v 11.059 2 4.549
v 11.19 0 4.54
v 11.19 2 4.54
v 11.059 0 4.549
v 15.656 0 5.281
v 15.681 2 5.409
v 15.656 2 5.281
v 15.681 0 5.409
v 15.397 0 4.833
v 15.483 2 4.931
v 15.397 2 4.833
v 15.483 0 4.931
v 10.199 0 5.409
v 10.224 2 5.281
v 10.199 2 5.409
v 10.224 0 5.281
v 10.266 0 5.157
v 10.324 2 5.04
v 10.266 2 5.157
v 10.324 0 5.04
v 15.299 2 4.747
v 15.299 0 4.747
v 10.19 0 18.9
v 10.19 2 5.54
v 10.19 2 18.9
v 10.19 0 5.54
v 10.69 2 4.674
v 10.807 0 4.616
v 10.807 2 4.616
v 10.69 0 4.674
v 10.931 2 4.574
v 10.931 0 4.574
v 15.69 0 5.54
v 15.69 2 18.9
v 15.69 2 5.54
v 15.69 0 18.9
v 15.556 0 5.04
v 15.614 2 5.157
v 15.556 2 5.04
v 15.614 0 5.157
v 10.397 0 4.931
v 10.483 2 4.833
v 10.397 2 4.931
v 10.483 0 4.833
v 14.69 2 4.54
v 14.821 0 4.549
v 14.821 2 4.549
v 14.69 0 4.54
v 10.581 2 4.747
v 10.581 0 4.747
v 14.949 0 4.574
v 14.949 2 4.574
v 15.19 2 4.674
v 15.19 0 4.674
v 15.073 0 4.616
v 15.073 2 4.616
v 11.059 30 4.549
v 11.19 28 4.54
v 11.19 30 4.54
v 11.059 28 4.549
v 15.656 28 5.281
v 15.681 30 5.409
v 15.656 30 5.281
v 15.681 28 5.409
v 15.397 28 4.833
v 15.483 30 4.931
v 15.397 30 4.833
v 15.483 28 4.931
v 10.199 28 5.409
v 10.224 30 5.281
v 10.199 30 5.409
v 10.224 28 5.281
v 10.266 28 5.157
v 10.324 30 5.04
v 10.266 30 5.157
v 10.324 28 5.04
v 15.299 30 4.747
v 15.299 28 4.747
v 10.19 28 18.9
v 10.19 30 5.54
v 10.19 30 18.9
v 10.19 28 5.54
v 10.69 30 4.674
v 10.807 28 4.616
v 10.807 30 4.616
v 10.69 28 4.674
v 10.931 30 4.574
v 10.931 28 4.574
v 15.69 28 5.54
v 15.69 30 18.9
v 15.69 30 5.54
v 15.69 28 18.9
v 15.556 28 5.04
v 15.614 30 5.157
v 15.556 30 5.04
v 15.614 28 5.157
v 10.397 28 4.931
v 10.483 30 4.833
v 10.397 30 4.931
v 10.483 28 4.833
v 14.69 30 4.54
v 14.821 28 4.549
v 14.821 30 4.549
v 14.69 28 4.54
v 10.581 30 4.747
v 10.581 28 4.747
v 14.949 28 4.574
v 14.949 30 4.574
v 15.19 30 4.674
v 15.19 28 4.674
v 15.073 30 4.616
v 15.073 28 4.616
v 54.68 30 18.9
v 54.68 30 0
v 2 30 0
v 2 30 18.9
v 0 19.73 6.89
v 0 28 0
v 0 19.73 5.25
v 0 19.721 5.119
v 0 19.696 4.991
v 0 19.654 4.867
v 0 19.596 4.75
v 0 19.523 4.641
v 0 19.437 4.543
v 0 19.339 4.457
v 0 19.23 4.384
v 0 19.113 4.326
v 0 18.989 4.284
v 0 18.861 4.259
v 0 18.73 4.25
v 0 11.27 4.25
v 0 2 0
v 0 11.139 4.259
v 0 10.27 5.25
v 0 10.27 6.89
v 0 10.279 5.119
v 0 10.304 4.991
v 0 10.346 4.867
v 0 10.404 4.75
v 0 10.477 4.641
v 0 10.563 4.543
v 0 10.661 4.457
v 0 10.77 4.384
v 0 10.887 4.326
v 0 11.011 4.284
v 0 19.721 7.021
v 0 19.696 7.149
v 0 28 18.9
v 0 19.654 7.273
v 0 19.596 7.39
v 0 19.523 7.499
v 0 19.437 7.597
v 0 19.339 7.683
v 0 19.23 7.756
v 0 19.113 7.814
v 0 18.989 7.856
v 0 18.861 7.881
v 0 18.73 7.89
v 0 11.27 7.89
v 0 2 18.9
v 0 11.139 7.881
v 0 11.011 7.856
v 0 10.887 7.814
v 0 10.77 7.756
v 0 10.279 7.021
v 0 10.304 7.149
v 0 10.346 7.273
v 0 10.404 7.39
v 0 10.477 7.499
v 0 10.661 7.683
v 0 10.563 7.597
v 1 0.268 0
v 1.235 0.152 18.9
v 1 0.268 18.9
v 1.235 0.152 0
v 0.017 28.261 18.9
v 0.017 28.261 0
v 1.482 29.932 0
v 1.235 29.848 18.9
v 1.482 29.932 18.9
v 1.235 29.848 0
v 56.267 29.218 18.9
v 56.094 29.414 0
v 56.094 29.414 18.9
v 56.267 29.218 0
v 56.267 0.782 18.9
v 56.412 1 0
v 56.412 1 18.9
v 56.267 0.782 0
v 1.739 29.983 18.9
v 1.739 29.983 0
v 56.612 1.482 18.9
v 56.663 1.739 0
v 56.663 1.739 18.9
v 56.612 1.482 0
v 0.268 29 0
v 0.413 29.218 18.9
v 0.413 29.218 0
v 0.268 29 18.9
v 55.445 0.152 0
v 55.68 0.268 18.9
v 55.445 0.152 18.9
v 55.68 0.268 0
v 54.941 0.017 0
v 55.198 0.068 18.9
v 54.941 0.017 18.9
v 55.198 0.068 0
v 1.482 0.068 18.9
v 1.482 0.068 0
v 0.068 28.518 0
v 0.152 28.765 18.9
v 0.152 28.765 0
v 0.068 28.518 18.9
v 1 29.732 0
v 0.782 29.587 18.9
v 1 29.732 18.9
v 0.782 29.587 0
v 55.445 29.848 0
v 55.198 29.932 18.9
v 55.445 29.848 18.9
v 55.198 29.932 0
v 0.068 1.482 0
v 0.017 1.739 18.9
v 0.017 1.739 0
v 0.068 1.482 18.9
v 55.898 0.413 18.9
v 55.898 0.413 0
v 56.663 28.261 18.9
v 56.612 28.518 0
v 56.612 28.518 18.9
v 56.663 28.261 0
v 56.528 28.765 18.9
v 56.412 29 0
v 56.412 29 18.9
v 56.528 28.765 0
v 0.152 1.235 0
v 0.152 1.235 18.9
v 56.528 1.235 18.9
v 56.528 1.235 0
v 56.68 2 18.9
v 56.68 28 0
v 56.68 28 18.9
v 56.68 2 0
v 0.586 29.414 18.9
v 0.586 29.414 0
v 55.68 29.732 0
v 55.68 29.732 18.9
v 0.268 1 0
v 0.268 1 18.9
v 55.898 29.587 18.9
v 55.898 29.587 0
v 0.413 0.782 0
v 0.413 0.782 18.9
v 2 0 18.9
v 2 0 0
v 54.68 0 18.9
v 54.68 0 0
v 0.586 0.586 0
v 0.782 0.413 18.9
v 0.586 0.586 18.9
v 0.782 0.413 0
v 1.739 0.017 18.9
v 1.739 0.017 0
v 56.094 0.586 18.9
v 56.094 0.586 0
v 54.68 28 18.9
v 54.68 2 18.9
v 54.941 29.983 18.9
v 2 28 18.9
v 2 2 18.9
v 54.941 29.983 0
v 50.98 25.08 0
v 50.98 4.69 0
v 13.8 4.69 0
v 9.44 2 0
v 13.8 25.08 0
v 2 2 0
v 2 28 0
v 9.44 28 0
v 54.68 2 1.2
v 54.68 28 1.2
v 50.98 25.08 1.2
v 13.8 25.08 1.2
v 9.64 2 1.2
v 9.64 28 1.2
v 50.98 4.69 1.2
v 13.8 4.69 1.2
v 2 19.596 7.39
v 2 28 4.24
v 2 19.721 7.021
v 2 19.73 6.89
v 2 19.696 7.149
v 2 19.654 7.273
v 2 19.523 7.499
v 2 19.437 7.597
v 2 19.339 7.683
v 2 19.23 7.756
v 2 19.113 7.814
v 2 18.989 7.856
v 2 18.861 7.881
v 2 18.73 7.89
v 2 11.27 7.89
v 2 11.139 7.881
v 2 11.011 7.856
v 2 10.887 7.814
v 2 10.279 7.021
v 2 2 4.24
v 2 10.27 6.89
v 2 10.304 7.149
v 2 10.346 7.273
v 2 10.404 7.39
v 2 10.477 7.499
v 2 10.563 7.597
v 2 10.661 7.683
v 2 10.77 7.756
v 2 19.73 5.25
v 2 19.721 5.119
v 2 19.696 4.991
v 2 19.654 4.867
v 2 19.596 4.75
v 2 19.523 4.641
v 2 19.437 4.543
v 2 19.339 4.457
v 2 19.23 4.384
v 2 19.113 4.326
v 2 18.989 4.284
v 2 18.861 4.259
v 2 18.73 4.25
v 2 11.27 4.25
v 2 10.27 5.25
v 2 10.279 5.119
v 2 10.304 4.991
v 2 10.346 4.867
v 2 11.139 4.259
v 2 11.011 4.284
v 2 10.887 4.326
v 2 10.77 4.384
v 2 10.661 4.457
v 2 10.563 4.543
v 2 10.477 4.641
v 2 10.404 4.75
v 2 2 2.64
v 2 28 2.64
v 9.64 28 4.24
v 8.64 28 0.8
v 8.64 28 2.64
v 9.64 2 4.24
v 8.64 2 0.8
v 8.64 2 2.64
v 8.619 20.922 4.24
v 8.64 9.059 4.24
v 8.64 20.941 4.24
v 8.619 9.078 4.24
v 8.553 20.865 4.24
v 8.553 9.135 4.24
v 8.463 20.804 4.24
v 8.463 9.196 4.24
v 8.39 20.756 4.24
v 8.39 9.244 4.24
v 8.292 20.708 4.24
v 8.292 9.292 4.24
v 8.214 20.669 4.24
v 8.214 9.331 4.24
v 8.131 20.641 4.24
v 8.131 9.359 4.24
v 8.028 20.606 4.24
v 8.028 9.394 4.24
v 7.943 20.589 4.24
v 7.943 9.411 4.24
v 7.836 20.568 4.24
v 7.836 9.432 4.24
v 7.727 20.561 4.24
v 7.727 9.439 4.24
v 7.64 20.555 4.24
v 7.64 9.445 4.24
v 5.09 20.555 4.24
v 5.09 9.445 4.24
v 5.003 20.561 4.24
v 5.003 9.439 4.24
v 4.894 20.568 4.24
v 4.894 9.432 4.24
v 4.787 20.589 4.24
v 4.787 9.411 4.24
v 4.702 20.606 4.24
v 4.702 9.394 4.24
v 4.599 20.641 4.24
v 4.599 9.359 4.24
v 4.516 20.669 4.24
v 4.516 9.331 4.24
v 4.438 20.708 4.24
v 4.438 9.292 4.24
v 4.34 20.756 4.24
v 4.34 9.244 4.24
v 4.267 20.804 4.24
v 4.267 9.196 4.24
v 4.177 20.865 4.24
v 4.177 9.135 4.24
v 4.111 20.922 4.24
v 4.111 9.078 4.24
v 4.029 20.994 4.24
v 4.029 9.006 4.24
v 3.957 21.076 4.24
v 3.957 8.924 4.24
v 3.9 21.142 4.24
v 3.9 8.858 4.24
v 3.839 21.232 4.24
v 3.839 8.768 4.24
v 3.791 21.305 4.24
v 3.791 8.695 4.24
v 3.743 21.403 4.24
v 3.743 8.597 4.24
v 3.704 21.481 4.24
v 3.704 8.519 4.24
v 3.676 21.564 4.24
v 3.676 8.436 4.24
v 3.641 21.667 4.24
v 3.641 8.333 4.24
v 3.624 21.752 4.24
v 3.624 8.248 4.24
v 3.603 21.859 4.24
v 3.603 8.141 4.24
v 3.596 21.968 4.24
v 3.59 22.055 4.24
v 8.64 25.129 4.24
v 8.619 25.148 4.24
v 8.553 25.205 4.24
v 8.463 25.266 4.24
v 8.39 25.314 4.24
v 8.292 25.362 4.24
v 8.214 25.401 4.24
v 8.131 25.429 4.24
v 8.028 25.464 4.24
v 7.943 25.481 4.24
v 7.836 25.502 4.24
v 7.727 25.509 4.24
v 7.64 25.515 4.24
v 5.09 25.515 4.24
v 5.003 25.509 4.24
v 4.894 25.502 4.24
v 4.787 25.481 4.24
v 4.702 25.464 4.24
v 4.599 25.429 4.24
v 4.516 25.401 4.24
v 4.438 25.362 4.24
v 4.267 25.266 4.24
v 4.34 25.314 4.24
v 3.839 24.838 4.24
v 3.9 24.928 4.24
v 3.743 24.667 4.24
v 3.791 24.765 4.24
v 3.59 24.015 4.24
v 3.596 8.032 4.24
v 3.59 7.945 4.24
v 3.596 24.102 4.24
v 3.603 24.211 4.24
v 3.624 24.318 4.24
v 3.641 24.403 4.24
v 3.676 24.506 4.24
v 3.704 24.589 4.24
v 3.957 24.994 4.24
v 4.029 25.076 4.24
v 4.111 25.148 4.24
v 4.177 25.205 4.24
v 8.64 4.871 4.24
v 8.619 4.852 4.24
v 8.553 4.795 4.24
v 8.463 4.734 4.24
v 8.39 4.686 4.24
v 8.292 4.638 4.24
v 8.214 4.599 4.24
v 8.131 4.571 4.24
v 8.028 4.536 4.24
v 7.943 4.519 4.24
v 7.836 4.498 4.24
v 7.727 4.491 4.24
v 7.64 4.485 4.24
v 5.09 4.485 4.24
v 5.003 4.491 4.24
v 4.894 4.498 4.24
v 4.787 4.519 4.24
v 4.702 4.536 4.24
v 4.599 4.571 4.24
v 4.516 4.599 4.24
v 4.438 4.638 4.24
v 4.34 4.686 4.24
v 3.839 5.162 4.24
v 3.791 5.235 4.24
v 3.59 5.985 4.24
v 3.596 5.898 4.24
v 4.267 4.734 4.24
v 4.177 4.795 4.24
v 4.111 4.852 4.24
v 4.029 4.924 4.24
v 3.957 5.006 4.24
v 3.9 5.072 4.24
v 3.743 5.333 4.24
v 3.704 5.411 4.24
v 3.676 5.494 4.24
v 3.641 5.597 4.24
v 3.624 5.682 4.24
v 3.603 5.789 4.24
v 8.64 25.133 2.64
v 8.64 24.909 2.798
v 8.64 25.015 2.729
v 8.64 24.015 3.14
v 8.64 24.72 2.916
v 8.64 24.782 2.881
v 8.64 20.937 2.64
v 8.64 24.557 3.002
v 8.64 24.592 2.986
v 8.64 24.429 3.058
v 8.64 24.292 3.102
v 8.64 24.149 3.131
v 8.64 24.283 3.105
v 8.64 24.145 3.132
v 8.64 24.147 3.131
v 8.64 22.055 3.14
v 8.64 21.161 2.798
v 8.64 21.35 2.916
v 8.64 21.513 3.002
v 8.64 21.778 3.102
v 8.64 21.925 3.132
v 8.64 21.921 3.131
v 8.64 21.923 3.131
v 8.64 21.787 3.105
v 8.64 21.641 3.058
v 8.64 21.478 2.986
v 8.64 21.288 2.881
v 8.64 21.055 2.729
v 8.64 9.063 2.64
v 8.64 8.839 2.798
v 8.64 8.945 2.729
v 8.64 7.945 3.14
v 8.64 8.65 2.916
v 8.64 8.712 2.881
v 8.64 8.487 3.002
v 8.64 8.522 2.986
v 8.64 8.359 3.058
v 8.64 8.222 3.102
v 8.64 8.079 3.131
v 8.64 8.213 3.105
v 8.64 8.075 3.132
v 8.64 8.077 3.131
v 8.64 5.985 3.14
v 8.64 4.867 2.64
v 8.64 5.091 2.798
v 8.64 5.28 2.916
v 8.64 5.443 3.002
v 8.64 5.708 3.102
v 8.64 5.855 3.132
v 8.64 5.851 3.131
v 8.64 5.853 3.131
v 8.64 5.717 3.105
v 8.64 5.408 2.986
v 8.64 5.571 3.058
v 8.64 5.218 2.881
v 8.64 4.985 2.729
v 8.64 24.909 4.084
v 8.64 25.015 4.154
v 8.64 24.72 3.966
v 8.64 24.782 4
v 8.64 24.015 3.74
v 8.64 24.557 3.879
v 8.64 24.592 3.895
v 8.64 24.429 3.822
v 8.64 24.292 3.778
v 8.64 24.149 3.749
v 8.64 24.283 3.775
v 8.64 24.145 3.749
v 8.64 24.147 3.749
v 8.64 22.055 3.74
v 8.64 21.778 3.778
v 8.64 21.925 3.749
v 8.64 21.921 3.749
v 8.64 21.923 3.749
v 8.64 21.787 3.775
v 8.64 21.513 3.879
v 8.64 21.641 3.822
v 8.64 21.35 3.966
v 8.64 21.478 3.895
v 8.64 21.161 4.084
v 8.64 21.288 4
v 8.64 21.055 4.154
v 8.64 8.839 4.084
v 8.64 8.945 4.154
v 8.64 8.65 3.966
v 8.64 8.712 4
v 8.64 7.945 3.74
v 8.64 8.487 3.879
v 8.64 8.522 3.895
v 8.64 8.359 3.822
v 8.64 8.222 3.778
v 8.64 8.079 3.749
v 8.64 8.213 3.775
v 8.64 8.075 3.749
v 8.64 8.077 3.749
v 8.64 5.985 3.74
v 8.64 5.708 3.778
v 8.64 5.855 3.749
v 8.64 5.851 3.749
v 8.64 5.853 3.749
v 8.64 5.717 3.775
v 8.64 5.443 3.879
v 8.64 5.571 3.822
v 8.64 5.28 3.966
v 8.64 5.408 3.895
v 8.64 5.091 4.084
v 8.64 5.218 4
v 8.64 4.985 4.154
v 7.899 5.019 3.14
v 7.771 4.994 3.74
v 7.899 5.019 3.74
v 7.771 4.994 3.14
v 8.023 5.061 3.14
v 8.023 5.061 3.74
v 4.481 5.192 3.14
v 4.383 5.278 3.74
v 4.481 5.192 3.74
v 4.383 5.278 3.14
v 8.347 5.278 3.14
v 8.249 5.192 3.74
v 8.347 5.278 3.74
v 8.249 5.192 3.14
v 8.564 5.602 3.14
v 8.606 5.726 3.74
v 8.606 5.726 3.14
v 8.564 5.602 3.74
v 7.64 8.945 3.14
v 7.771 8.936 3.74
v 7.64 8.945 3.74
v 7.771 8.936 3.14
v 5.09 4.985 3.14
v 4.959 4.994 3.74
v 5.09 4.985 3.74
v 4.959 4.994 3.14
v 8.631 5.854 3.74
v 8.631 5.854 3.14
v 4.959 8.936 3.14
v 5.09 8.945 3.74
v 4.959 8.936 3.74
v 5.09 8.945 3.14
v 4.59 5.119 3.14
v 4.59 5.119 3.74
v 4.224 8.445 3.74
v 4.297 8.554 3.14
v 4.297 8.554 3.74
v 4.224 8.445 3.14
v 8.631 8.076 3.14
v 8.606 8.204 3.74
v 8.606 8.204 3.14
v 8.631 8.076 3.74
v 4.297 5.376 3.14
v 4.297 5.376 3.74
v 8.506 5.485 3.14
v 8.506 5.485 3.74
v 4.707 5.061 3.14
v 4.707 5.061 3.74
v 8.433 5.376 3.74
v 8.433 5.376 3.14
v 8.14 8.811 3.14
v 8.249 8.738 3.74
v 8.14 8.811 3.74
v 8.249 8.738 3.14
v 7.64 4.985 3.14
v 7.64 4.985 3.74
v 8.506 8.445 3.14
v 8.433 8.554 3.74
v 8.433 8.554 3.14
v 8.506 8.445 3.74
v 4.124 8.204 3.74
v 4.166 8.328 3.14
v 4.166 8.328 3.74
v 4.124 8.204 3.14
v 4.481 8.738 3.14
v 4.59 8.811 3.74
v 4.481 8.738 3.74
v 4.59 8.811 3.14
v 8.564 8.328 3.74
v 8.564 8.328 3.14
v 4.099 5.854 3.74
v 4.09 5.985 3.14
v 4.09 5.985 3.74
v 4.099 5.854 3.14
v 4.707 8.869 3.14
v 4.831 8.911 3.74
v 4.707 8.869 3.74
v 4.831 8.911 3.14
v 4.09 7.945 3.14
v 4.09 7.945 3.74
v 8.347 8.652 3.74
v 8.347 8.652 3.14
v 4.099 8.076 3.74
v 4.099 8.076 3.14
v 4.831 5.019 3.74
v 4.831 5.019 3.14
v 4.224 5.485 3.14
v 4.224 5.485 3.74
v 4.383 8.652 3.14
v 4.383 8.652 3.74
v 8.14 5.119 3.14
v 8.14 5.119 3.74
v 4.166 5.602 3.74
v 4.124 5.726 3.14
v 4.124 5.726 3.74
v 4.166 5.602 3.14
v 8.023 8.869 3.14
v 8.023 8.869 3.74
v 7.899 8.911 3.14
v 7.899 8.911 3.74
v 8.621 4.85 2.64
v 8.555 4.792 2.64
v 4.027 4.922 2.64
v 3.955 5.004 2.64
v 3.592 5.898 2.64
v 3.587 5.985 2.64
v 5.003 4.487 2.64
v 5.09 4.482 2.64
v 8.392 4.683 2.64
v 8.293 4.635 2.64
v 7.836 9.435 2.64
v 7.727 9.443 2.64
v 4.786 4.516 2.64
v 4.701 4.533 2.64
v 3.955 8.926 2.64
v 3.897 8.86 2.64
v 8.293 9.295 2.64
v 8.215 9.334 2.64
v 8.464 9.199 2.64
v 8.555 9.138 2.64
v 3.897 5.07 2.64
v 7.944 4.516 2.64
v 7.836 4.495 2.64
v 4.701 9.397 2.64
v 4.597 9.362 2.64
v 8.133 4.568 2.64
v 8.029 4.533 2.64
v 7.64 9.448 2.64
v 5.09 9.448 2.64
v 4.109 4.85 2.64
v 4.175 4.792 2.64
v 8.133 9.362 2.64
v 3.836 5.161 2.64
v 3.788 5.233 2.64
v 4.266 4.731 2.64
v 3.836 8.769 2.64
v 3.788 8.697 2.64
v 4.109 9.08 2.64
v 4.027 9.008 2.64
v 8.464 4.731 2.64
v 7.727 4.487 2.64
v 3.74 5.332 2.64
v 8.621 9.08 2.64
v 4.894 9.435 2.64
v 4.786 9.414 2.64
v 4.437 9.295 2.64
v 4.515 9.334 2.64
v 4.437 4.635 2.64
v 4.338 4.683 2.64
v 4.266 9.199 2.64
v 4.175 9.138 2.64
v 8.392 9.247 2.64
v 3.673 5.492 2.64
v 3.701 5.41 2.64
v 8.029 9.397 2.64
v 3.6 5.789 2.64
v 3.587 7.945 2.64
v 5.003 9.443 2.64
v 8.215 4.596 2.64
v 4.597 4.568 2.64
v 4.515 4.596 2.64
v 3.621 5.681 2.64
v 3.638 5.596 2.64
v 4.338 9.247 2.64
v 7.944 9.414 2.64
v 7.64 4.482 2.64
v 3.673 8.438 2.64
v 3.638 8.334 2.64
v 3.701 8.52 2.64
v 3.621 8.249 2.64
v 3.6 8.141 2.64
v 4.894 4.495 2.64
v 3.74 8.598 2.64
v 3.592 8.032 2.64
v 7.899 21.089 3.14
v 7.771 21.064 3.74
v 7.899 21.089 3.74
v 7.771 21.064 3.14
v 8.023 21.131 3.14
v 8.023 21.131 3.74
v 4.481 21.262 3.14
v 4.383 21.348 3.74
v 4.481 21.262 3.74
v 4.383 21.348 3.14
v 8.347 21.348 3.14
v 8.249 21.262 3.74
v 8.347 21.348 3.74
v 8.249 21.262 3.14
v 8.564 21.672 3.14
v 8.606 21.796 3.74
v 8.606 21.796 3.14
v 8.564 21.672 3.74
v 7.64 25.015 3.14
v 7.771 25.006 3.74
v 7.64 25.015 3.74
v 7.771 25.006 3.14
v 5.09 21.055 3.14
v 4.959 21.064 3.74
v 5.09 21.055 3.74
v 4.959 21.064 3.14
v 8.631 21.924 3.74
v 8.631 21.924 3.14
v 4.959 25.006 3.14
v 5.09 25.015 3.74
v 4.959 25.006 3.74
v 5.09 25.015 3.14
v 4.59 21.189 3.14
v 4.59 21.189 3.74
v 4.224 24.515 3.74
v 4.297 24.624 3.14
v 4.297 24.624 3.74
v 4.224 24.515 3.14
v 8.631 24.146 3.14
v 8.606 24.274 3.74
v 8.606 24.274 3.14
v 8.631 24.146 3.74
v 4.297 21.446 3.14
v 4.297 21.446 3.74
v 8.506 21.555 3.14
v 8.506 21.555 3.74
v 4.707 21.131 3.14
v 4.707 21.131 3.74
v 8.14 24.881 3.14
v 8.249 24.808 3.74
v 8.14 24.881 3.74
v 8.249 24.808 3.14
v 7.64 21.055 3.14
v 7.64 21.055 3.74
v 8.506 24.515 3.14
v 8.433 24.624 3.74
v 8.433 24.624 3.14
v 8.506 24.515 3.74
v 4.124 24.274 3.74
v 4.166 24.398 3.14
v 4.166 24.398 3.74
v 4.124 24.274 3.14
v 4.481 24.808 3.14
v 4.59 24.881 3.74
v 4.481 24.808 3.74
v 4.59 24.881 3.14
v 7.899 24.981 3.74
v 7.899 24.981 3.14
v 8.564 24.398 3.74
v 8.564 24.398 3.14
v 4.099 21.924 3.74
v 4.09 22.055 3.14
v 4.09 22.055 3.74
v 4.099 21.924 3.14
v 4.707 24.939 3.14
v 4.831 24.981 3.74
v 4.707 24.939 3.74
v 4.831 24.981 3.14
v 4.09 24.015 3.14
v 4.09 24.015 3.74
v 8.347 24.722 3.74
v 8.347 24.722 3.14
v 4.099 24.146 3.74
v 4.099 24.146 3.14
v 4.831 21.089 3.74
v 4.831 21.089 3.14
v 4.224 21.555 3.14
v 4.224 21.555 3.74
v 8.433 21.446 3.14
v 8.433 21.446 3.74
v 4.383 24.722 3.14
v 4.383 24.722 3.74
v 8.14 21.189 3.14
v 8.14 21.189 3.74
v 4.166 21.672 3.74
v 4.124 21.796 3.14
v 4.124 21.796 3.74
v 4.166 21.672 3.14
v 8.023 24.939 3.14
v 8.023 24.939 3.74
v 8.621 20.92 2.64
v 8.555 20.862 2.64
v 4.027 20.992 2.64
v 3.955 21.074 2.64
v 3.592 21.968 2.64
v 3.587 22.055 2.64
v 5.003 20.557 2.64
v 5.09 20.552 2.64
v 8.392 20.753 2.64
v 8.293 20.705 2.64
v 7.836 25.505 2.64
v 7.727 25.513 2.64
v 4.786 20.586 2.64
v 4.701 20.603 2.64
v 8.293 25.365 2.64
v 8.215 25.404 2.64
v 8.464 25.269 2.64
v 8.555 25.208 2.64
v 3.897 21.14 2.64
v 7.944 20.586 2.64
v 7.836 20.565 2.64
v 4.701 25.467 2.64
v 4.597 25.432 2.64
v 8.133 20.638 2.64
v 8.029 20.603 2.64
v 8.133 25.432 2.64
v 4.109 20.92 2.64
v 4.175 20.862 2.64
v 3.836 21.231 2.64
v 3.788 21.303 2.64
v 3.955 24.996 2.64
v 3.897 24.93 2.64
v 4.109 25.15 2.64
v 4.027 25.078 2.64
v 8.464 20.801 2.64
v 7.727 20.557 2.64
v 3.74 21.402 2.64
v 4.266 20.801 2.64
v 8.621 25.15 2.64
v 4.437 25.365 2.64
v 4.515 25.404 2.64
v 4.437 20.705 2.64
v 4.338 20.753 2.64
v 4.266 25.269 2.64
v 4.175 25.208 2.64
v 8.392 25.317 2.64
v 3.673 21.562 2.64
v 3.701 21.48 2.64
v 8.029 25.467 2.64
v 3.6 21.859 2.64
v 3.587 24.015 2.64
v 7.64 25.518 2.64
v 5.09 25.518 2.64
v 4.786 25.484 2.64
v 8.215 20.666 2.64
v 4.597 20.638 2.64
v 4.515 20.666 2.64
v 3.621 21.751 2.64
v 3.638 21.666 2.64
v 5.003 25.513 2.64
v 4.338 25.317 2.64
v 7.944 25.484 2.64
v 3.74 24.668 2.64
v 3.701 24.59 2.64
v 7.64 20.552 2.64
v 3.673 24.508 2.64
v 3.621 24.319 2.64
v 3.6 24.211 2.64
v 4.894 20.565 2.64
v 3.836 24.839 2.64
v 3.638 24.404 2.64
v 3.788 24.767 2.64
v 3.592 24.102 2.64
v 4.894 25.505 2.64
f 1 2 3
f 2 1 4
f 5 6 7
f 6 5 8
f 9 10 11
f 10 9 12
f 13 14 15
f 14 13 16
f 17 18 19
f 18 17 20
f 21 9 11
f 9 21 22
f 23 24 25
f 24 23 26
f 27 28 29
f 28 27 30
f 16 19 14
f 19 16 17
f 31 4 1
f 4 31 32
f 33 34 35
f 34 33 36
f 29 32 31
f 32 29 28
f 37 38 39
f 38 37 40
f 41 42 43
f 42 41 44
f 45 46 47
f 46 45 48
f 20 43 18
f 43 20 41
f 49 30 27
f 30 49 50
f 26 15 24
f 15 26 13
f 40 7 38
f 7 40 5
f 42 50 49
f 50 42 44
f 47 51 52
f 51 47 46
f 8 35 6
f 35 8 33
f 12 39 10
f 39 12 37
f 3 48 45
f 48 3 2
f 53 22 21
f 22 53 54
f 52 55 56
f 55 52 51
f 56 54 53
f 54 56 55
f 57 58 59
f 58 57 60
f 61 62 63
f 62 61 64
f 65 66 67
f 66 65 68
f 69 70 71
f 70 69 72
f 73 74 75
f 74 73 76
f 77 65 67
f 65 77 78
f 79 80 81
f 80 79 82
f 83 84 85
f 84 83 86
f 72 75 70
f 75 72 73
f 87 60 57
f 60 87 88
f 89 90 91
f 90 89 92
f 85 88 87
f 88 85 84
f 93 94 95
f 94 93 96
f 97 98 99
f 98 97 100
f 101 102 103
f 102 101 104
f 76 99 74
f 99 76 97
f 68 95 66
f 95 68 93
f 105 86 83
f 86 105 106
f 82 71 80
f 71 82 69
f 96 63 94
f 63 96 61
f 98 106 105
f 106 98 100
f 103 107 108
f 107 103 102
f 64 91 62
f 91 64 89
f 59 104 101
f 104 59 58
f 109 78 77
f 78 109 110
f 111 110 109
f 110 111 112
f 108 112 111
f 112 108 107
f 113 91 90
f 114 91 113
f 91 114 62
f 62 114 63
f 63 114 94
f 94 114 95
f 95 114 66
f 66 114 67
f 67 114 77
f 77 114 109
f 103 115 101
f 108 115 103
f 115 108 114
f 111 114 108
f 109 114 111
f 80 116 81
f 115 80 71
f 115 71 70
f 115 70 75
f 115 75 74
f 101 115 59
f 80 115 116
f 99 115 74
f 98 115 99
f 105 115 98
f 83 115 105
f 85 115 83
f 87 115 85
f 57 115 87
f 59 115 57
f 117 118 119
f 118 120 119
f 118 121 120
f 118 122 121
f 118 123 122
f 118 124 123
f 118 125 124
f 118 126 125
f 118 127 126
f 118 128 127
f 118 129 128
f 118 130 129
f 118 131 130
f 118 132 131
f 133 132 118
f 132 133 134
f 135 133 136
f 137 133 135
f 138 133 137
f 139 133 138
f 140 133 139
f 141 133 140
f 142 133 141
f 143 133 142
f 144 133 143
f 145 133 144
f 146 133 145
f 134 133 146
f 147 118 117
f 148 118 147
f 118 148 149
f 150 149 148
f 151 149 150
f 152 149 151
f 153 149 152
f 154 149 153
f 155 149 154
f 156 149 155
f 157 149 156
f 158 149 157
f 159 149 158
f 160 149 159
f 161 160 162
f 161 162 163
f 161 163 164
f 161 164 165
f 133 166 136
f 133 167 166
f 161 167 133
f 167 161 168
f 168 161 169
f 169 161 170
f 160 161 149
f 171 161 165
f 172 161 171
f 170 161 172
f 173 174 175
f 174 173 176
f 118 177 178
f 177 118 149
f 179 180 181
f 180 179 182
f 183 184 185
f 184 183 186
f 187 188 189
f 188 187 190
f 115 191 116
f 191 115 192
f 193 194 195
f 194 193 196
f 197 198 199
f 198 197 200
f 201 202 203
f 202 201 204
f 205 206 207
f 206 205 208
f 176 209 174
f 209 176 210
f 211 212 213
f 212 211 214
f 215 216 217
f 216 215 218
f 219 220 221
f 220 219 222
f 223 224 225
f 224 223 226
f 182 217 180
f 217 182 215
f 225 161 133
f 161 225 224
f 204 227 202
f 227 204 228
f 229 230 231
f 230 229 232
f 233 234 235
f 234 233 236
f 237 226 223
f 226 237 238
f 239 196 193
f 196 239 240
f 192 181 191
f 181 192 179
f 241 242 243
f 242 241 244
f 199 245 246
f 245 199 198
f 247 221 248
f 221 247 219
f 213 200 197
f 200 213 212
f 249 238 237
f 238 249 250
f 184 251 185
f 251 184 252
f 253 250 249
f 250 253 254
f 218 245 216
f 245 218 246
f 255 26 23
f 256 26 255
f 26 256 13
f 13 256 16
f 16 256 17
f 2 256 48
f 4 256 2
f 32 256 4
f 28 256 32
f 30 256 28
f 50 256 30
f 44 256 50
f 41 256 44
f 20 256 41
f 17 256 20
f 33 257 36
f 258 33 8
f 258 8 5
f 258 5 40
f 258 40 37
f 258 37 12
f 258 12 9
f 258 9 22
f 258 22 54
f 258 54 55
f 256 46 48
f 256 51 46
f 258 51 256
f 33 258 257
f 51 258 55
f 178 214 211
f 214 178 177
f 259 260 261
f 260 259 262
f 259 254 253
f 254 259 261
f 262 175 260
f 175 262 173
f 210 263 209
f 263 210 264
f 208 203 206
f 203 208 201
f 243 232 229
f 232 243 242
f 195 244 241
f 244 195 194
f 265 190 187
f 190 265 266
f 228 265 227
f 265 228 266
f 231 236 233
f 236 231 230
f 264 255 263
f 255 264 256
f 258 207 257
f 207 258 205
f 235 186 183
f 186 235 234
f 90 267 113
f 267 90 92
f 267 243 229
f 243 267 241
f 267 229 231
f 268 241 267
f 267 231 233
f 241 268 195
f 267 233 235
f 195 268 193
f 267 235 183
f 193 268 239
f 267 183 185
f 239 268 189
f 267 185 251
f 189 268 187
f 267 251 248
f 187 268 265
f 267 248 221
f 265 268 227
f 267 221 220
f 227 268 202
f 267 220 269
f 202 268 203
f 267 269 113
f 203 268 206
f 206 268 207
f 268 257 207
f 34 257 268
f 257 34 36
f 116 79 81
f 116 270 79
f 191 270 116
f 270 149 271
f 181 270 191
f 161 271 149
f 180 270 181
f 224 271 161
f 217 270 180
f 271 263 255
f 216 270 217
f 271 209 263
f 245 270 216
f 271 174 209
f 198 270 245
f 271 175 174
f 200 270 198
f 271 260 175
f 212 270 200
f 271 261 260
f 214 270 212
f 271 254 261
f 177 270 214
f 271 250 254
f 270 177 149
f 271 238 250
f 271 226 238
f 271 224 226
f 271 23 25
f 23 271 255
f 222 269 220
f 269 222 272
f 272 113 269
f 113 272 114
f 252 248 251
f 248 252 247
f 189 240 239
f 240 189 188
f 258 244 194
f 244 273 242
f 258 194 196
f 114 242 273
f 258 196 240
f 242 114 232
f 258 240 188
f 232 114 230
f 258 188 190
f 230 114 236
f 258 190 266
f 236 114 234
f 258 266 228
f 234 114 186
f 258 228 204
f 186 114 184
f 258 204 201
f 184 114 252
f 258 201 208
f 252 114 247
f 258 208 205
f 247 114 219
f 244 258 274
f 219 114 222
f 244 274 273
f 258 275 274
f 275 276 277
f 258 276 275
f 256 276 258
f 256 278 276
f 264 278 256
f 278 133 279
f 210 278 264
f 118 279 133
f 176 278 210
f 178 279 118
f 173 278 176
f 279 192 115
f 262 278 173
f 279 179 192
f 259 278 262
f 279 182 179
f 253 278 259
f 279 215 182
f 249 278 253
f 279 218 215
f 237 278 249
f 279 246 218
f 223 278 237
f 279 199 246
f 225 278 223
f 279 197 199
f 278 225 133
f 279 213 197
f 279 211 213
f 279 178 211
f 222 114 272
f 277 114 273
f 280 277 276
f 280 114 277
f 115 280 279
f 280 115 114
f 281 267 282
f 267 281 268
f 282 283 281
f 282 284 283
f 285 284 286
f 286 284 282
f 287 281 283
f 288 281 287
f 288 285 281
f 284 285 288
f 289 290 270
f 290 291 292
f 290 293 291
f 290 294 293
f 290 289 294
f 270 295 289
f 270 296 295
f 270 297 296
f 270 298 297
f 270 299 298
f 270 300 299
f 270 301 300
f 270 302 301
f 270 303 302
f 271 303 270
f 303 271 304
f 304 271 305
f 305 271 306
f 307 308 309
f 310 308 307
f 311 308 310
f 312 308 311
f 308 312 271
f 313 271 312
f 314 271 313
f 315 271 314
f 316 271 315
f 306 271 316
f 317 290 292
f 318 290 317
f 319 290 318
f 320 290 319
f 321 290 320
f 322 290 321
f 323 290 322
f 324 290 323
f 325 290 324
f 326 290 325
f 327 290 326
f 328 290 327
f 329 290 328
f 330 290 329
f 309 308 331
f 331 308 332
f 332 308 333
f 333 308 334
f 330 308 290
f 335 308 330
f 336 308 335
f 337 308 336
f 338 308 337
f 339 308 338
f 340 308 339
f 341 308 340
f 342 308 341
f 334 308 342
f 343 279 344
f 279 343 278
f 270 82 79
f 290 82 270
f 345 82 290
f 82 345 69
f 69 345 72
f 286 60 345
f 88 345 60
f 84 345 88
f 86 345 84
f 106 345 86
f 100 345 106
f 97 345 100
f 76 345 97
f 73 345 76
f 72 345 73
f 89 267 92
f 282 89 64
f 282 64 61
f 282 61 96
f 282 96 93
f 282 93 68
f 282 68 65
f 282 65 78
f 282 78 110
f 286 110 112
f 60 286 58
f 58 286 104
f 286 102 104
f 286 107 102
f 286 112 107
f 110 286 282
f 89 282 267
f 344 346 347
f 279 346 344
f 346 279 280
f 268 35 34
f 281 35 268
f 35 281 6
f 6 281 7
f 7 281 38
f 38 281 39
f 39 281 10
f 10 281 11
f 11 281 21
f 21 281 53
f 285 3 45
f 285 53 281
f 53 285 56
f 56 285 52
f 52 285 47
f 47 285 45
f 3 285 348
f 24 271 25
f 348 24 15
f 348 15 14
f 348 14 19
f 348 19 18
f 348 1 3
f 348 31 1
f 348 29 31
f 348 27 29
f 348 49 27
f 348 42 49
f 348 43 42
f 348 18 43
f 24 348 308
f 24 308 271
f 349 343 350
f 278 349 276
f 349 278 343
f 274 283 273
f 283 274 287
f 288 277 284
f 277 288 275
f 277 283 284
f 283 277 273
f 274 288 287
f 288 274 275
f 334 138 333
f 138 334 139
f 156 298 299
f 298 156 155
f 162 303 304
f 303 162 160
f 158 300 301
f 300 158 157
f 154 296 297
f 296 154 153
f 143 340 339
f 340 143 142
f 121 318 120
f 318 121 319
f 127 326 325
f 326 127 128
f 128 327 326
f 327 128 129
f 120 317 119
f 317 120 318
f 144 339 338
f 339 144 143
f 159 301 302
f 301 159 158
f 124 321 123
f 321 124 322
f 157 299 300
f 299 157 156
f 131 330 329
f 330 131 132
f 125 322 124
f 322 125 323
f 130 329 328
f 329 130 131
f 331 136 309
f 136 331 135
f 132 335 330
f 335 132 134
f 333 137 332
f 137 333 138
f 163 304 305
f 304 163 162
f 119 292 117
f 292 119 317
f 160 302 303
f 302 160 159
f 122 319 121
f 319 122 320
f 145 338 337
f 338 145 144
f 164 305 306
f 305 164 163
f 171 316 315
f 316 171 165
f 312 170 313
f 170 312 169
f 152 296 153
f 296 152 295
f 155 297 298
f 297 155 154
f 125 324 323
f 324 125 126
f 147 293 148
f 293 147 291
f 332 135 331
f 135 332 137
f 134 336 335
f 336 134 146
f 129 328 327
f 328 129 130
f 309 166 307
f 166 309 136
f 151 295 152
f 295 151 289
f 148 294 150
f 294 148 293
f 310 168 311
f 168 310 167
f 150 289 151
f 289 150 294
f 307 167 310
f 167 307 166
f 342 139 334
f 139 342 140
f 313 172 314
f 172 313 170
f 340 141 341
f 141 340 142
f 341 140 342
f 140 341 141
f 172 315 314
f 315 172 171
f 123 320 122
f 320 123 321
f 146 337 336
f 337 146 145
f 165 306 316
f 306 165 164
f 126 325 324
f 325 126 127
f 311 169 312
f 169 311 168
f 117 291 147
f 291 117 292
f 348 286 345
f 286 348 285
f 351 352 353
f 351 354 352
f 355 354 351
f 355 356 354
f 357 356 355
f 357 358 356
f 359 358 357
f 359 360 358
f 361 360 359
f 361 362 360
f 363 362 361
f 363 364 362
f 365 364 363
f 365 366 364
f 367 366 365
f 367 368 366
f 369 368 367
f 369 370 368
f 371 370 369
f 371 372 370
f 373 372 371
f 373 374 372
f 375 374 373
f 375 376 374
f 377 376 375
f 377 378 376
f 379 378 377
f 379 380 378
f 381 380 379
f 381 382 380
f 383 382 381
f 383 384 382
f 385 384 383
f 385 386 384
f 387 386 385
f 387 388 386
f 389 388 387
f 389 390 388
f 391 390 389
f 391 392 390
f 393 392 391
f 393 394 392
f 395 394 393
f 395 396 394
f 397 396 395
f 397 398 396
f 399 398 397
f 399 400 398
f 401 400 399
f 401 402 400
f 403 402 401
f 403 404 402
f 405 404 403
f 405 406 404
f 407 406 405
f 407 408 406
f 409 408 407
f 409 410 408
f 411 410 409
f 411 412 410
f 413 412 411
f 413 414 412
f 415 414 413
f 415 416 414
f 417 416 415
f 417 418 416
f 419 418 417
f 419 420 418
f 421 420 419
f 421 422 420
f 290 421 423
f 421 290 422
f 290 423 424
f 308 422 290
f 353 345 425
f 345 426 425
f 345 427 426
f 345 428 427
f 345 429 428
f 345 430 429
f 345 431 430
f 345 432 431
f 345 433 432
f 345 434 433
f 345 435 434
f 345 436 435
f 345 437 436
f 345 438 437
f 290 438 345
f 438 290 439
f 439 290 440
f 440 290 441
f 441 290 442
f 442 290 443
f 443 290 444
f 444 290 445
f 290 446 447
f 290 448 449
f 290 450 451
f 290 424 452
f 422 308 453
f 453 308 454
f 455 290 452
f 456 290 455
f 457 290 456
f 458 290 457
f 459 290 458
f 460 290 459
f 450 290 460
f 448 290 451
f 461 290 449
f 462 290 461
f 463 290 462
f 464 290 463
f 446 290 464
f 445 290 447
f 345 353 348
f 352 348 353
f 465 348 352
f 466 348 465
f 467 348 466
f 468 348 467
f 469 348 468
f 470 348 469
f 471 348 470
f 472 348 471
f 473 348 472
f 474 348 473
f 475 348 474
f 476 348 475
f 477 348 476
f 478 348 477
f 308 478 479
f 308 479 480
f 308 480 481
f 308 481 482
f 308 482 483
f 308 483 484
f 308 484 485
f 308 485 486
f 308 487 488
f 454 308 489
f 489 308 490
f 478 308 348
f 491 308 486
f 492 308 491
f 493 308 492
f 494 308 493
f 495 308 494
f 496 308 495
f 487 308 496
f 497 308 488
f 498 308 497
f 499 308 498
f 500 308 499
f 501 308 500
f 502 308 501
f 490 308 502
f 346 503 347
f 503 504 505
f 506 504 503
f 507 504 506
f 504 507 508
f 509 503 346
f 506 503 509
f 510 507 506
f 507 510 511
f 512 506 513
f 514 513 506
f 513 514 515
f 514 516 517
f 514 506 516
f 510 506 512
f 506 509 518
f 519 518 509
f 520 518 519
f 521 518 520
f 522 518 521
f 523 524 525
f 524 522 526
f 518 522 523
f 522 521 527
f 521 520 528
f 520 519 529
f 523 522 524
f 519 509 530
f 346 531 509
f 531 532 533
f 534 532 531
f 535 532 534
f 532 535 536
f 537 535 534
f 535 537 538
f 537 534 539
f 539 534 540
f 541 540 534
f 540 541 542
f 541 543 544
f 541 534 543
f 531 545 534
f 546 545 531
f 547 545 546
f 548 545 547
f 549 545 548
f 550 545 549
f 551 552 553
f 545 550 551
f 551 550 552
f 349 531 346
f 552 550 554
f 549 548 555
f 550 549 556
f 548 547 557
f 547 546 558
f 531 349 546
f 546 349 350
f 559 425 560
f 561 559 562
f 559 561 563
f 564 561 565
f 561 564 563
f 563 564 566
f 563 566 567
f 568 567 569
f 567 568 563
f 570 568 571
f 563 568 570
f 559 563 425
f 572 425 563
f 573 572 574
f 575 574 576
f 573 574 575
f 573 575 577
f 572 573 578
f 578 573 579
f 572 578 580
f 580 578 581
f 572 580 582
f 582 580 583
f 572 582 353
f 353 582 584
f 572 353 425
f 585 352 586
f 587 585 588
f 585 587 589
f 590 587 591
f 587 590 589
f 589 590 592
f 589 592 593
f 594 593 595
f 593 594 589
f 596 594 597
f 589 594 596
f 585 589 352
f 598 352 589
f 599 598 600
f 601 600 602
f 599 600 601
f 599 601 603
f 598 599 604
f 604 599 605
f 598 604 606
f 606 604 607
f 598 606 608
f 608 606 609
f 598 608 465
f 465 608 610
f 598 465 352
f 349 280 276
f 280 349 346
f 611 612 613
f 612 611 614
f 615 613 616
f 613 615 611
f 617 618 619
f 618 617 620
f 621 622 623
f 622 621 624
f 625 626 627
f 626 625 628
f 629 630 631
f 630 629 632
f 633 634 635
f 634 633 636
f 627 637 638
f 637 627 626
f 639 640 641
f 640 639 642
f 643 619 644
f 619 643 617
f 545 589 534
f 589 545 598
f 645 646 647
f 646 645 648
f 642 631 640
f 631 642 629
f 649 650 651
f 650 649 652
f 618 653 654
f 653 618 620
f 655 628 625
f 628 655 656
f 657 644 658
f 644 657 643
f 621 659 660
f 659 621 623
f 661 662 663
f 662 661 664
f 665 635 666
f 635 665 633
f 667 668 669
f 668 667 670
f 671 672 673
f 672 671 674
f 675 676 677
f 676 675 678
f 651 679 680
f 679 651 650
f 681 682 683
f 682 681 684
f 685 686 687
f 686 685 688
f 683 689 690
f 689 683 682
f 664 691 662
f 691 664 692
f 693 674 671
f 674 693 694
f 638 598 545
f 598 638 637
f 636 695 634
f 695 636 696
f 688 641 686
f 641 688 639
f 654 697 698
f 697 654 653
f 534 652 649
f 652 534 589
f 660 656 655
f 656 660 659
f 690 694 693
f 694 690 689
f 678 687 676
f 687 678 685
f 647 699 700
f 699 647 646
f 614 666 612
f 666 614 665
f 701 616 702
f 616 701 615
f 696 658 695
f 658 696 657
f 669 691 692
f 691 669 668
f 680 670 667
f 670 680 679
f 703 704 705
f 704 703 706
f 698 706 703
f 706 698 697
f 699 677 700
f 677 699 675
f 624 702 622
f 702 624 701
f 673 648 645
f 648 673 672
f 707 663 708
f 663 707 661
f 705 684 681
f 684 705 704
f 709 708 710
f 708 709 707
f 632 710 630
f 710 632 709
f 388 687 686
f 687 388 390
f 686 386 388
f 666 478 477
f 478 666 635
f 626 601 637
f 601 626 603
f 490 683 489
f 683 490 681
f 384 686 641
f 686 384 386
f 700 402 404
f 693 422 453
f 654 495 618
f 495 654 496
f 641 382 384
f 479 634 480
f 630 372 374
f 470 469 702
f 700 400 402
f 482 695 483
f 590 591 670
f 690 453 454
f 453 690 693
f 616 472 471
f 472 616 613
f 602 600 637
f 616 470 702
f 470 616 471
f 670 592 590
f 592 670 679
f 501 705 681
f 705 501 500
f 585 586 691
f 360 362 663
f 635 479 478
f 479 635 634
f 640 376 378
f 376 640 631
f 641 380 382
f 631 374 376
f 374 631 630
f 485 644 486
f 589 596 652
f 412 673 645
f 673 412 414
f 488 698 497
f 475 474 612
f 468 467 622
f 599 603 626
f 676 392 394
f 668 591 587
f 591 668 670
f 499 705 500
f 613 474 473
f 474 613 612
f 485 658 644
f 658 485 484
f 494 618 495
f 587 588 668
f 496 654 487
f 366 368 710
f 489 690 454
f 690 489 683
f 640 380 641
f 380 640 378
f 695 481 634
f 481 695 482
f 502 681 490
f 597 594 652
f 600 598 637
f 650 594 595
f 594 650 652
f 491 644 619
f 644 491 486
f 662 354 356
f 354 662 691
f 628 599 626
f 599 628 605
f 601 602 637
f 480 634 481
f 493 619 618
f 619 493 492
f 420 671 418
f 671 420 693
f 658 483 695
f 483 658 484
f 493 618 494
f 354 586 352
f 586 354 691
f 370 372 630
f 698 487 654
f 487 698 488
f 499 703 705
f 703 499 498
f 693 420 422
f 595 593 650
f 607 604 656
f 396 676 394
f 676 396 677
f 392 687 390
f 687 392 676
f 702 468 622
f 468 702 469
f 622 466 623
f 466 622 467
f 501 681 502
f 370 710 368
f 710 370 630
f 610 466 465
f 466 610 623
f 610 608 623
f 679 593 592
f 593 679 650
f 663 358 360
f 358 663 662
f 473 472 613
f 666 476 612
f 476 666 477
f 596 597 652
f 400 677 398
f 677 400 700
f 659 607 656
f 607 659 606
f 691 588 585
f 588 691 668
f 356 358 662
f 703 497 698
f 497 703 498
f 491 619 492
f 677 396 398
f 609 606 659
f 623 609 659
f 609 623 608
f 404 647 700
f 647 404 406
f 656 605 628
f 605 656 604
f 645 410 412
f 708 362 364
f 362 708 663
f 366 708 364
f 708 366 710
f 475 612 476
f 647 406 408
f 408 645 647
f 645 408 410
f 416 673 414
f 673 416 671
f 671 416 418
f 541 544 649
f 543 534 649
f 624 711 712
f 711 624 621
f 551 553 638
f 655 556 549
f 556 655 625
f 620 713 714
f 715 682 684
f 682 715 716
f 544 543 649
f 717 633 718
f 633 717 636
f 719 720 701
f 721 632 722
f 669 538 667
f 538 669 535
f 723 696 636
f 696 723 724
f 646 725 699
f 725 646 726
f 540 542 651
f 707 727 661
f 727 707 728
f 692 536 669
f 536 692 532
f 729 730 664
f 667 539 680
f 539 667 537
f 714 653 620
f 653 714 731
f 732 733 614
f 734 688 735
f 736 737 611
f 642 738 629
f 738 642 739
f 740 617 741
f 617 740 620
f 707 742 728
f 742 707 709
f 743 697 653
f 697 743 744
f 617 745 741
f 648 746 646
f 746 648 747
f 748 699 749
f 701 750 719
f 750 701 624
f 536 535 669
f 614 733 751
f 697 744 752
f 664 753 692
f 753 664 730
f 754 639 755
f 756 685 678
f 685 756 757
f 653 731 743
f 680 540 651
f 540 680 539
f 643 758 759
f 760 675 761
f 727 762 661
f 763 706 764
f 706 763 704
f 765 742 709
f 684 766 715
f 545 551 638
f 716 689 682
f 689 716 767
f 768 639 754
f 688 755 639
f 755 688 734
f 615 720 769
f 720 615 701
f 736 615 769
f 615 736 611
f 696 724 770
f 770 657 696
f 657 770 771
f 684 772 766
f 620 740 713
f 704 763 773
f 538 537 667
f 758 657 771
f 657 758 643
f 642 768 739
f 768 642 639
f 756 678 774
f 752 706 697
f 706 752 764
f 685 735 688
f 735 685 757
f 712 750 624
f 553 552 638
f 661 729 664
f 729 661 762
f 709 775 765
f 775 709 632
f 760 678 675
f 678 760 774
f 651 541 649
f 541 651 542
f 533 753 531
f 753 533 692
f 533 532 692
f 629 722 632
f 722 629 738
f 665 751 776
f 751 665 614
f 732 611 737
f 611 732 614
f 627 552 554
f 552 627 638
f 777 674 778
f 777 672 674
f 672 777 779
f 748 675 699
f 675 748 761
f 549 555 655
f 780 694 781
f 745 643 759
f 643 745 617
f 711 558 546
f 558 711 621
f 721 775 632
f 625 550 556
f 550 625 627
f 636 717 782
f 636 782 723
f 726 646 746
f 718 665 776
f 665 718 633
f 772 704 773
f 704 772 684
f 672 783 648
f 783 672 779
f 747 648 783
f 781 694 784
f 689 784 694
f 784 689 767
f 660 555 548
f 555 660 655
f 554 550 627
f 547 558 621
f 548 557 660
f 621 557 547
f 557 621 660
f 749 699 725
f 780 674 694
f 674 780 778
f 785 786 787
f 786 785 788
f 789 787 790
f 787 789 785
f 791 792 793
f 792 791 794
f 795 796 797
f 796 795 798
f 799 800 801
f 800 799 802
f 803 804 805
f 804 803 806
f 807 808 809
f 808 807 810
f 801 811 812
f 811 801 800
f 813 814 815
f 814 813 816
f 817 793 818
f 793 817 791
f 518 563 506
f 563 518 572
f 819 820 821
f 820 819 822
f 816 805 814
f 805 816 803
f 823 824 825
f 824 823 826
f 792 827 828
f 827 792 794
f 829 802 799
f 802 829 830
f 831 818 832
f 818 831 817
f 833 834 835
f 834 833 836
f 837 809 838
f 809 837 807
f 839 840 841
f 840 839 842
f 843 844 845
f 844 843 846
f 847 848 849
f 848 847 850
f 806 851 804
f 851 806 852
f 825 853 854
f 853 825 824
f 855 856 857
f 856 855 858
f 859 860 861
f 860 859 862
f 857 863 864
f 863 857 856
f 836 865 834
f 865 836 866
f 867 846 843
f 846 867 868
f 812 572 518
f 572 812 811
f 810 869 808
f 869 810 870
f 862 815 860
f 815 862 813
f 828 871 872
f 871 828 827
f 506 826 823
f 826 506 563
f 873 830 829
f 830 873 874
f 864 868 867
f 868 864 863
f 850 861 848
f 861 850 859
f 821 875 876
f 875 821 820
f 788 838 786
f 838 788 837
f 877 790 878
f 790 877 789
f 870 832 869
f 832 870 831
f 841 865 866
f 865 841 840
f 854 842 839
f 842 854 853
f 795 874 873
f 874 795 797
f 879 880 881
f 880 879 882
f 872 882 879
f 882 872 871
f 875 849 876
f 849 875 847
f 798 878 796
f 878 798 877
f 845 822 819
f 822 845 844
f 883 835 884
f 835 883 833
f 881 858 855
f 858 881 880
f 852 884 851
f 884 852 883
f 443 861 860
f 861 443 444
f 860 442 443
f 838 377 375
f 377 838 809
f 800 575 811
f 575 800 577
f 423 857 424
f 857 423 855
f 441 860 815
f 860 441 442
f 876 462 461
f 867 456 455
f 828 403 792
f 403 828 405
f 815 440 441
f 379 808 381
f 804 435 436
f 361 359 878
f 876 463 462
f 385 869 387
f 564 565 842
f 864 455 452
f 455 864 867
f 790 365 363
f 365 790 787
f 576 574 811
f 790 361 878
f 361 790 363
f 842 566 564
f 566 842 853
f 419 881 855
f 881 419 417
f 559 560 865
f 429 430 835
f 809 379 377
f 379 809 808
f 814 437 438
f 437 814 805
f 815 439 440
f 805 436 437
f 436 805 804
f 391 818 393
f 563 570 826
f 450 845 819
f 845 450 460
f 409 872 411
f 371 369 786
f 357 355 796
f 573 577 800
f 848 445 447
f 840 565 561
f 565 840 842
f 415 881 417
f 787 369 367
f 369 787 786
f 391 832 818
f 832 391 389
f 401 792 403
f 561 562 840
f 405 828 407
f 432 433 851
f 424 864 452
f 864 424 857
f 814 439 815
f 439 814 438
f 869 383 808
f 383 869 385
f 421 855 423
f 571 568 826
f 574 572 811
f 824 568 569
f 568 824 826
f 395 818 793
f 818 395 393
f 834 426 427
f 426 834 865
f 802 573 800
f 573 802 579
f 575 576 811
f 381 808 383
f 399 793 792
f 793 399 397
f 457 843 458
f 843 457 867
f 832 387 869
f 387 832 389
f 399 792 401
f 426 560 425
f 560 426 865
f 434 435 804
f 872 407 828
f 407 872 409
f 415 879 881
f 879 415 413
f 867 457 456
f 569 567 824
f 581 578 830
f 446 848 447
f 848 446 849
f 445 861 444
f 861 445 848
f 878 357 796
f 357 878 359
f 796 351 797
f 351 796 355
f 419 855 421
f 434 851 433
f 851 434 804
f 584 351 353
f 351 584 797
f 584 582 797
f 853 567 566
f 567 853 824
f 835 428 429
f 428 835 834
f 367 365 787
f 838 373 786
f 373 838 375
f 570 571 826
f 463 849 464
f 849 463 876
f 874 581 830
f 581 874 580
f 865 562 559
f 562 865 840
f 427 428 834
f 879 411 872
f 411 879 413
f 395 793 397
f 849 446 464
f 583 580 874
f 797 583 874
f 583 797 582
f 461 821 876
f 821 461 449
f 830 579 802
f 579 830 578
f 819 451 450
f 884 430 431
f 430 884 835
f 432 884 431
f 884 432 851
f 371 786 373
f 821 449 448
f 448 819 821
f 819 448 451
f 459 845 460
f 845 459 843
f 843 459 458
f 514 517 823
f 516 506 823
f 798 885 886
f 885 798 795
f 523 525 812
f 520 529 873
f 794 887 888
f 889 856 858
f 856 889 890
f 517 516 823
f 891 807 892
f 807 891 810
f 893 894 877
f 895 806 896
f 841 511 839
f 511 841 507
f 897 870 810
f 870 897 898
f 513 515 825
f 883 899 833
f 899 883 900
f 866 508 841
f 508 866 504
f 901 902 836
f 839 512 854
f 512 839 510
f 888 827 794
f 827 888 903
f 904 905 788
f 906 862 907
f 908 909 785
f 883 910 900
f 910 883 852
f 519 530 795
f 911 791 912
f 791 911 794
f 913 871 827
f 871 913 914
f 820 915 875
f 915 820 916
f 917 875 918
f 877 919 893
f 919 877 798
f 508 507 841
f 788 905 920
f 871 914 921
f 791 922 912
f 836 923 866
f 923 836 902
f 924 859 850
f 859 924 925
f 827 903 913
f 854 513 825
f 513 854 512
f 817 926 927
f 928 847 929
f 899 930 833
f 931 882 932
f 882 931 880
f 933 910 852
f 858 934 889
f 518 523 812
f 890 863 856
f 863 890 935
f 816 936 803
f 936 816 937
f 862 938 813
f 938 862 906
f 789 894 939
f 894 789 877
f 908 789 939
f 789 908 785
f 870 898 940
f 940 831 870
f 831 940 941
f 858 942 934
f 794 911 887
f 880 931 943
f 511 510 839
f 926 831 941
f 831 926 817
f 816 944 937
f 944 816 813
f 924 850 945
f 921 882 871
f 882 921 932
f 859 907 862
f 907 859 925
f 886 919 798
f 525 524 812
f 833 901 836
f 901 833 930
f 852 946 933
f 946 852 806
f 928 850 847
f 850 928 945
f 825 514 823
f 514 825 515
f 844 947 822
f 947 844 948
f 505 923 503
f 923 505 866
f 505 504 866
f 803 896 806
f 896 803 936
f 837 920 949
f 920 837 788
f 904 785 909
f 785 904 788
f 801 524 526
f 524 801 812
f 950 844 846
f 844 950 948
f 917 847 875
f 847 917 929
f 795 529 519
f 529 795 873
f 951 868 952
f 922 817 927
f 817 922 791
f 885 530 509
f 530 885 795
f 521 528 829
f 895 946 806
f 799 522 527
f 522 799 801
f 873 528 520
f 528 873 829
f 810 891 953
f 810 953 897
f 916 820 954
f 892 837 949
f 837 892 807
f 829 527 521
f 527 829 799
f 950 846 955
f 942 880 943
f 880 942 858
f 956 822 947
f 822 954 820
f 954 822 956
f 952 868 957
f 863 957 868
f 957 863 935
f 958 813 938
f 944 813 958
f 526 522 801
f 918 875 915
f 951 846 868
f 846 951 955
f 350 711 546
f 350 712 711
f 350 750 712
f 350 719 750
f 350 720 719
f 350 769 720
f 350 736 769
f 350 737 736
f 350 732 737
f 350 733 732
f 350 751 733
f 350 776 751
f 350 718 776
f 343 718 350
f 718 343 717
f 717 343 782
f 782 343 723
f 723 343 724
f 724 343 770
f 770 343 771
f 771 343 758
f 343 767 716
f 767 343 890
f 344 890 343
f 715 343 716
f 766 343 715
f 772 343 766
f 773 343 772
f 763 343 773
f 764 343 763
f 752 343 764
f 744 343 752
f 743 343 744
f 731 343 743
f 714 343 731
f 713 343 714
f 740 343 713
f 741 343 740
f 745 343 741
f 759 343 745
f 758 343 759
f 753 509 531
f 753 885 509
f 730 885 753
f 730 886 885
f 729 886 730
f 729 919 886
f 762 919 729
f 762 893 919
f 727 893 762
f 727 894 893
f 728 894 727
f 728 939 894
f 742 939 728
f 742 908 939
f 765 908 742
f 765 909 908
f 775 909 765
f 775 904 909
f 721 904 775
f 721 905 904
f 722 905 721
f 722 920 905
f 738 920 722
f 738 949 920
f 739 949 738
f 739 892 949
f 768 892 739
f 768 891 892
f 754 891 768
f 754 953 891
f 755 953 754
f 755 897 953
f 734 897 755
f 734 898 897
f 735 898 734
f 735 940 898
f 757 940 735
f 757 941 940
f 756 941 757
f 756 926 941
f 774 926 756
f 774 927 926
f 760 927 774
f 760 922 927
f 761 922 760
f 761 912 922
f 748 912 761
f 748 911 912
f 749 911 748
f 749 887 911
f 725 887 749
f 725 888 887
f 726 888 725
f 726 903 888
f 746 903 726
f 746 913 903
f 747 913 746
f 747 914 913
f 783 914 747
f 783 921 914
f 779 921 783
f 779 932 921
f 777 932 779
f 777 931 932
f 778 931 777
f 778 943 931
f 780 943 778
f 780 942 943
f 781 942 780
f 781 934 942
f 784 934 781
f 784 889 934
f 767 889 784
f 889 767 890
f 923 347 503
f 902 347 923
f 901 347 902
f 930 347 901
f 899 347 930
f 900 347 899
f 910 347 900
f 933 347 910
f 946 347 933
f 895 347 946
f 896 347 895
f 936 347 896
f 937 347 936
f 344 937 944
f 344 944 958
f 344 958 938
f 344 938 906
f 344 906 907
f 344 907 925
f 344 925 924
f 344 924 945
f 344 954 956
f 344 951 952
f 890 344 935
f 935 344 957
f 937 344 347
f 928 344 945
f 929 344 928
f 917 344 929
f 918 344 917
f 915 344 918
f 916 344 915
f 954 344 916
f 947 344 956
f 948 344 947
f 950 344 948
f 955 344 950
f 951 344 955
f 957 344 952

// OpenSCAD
// EXPORT TO STL (run in PowerShell from this folder; same as F6 then F7 in the app):
// & "C:\Program Files\OpenSCAD\openscad.exe" -o ..\lilygo_front_shell_test2.stl build.scad
// build.scad - LilyGO front shell, built step by step (plate-down)
$fn = 48;

// STEP 1: settings (all sizes in mm)
pcb_l = 51.74;  pcb_w = 25.51;  pcb_t = 1.16;   // the circuit board
fit   = 0.20;                                    // gap around the board
rw    = 2.0;                                     // wall thickness
bat_extra = 5.0;   // how far the 802030 battery sticks out above the old 13.9 mm shell (measured)
bat_clr   = 0.0;   // extra clearance above the battery (the 5 mm already includes it)
depth = 13.9 + bat_extra + bat_clr;          // total height of the shell (18.9)
plate = 1.2;                                     // STEP 2: thickness of the top plate

// STEP 3: more measurements, all taken from the board's USB-C edge (x) and long edge (y)
plug_over = 0.54;                                // white plugs stick out past the USB-C end
blk_x0 = 6.00;  blk_w = 25.6;                    // clear acrylic block: starts at x = 6, 25.6 wide
blk_y0 = (pcb_w - blk_w) / 2;                    // block is centred on the board
pan_l = 37.18;  pan_w = 20.39;                   // black screen panel = the window size
pan_dx = 5.06;  pan_dtop = 2.72;                 // panel inset from block's left and top edges
pan_x0 = blk_x0 + pan_dx;
pan_y0 = blk_y0 + blk_w - pan_dtop - pan_w;

// STEP 4: USB-C port, and the height of the PCB's top surface
usbc_w = 9.06;  usbc_h = 3.19;                   // USB-C port size
usb_clr = 0.20;                                  // clearance around the port
blk_h = 6.44;                                    // PCB top -> top of the clear block
pcb_top = plate + blk_h + 0.1;                   // z of the PCB's top surface (plate-down: measured up from the bed)

// STEP 5: side buttons (power / reset), one on each long wall
side_x = 10.2;                                  // distance from the USB-C edge to the slot's centre
slot_len = 5.5;                                 // slot length along the wall
slot_top = 3.2;                                  // slot reaches this far above the PCB top

// STEP 6: where the low button end stops (just before the clear block)
step_x1 = blk_x0 - fit;                       // board x where the clear block starts (the cut itself ends step_extra further on)

// STEP 7: the drop-down wall
step_extra = 1.1;  // widen the step 6 cut by this much
step_wall  = 1.0;  // NOTE: thinned to 1.0 so the button finger holes clear; far face stays at the end of the cut                              // thickness of the cross wall
wall_cham = 0.8;                   // size of the bevel on the wall's outside edge (wall is 1.0 thick, so keep it under that)
step_under = 3.5;                              // underside of the future step roof, below the PCB top
step_plate = 1.6;                              // thickness of the future step roof
wall_top   = pcb_top - step_under;              // top of the cross wall (plate-down height)

// inside size (now includes the plugs and the wider block)
in_l = pcb_l + plug_over + 2*fit;
in_w = blk_w + 2*fit;

// where the board's own corner (x = 0, y = 0) sits inside the shell
bx = rw + plug_over + fit;
by = rw + fit - blk_y0;

corner_r = 2.0;   // outside corner radius

difference() {
  // the outer block = inside size + a wall on every side
  rrect(in_l + 2*rw, in_w + 2*rw, depth, corner_r);

  // STEP 2: the cavity, sitting on top of the plate, open at the top
  translate([rw, rw, plate])
    cube([in_l, in_w, depth]);

  // STEP 3: the screen window, cut straight through the plate
  translate([bx + pan_x0, by + pan_y0, -1])
    cube([pan_l, pan_w, plate + 2]);

  // STEP 4: USB-C opening through the end wall (x = 0 side)
  // centred on the board's width; from just below the PCB up past the port top
  // STEP 10: rounded corners. hull() wraps a skin around four cylinders lying along x, one per corner
  usb_r = 1.0;                       // corner radius
  usb_w = usbc_w + 2*usb_clr;        // opening width
  usb_h = usbc_h + 0.3 + 0.15;       // opening height
  translate([-1, by + pcb_w/2 - usb_w/2, pcb_top - usbc_h - 0.3])
    hull()
      for (y = [usb_r, usb_w - usb_r], z = [usb_r, usb_h - usb_r])
        translate([0, y, z]) rotate([0, 90, 0]) cylinder(r = usb_r, h = rw + 2);

  // STEP 5: side-button slots, both long walls (the for loop runs the cut twice)
  slot_r = 1.0;   // radius of the rounded bottom end
  for (yy = [-1, rw + in_w - 1])
    translate([bx + side_x - slot_len/2, yy, pcb_top - slot_top])
      hull() {                                  // rounded bottom end: two cylinders + the straight upper part
        for (x = [slot_r, slot_len - slot_r])
          translate([x, 0, slot_r]) rotate([-90, 0, 0]) cylinder(r = slot_r, h = rw + 2);
        translate([0, 0, slot_r]) cube([slot_len, rw + 2, depth]);
      }

  // STEP 6: cut the button-end square out of the plate, inside the walls
  translate([rw, rw, -1])
    cube([bx + step_x1 + step_extra - rw, in_w, plate + 2]);   // +2 so the top pokes above the plate (no shared surface)
}

// STEP 7: the drop-down wall, ADDED after the cuts so nothing removes it
difference() {
  translate([bx + step_x1 + step_extra - step_wall, rw, 0])
    cube([step_wall, in_w, wall_top]);

  // red-line chamfer: a square bar turned 45 degrees, centred on the wall's outside edge (button side, screen-side face).
  // the bar is wall_cham*sqrt(2) wide, so it slices off a wall_cham (0.8 mm) 45 degree corner. 1 mm extra each end in y so it cuts clean through.
  translate([bx + step_x1 + step_extra - step_wall, rw - 1, 0])
    rotate([0, 45, 0])
      translate([-wall_cham*sqrt(2)/2, 0, -wall_cham*sqrt(2)/2])
        cube([wall_cham*sqrt(2), in_w + 2, wall_cham*sqrt(2)]);
}

// STEP 8: the step roof, a thin slab on top of the wall, bridging the opened button end
// (its top is level with the wall top; step_plate is how thick it is)
// STEP 9: finger holes through the roof, one over each front button (mirrored across the width)
btn_x0 = 1.65;  btn_x1 = 5.82;    // button x range on the board
btn_y0 = 3.04;  btn_y1 = 6.40;    // button y range, measured from the board edge
mark   = 0.30;                    // extra room around each button for a finger
hole_x1 = step_x1 + step_extra - step_wall;   // stop the holes at the wall's face

cham    = 0.5;                    // chamfer size on the hole rims
hole_r  = 1.0;                    // corner radius of the finger holes

// a box with rounded vertical edges: hull() wraps a skin around four cylinders, one per corner
module rrect(l, w, h, r) {
  hull()
    for (x = [r, l - r], y = [r, w - r])
      translate([x, y, 0]) cylinder(r = r, h = h);
}

difference() {
  translate([rw, rw, wall_top - step_plate])
    cube([bx + step_x1 + step_extra - rw, in_w, step_plate]);
  for (m = [0, 1]) {
    yb = (m == 0) ? btn_y0 : pcb_w - btn_y1;
    translate([bx + btn_x0 - mark, by + yb - mark, wall_top - step_plate - 1])
      rrect(hole_x1 - btn_x0 + mark, btn_y1 - btn_y0 + 2*mark, step_plate + 2, hole_r);

    // chamfer: a 45 degree bevel around the top rim of each hole (hull of the hole outline at the roof's top and a bigger one 1 mm above)
    hull() {
      translate([bx + btn_x0 - mark, by + yb - mark, wall_top - cham])
        rrect(hole_x1 - btn_x0 + mark, btn_y1 - btn_y0 + 2*mark, 0.01, hole_r);
      translate([bx + btn_x0 - mark - cham - 1, by + yb - mark - cham - 1, wall_top + 1])
        rrect(hole_x1 - btn_x0 + mark + 2*(cham+1), btn_y1 - btn_y0 + 2*mark + 2*(cham+1), 0.01, hole_r + cham + 1);
    }

    // same bevel on the other face of the roof (the mirror image, mirrored about the roof's underside)
    hull() {
      translate([bx + btn_x0 - mark, by + yb - mark, wall_top - step_plate + cham - 0.01])
        rrect(hole_x1 - btn_x0 + mark, btn_y1 - btn_y0 + 2*mark, 0.01, hole_r);
      translate([bx + btn_x0 - mark - cham - 1, by + yb - mark - cham - 1, wall_top - step_plate - 1])
        rrect(hole_x1 - btn_x0 + mark + 2*(cham+1), btn_y1 - btn_y0 + 2*mark + 2*(cham+1), 0.01, hole_r + cham + 1);
    }
  }
}
